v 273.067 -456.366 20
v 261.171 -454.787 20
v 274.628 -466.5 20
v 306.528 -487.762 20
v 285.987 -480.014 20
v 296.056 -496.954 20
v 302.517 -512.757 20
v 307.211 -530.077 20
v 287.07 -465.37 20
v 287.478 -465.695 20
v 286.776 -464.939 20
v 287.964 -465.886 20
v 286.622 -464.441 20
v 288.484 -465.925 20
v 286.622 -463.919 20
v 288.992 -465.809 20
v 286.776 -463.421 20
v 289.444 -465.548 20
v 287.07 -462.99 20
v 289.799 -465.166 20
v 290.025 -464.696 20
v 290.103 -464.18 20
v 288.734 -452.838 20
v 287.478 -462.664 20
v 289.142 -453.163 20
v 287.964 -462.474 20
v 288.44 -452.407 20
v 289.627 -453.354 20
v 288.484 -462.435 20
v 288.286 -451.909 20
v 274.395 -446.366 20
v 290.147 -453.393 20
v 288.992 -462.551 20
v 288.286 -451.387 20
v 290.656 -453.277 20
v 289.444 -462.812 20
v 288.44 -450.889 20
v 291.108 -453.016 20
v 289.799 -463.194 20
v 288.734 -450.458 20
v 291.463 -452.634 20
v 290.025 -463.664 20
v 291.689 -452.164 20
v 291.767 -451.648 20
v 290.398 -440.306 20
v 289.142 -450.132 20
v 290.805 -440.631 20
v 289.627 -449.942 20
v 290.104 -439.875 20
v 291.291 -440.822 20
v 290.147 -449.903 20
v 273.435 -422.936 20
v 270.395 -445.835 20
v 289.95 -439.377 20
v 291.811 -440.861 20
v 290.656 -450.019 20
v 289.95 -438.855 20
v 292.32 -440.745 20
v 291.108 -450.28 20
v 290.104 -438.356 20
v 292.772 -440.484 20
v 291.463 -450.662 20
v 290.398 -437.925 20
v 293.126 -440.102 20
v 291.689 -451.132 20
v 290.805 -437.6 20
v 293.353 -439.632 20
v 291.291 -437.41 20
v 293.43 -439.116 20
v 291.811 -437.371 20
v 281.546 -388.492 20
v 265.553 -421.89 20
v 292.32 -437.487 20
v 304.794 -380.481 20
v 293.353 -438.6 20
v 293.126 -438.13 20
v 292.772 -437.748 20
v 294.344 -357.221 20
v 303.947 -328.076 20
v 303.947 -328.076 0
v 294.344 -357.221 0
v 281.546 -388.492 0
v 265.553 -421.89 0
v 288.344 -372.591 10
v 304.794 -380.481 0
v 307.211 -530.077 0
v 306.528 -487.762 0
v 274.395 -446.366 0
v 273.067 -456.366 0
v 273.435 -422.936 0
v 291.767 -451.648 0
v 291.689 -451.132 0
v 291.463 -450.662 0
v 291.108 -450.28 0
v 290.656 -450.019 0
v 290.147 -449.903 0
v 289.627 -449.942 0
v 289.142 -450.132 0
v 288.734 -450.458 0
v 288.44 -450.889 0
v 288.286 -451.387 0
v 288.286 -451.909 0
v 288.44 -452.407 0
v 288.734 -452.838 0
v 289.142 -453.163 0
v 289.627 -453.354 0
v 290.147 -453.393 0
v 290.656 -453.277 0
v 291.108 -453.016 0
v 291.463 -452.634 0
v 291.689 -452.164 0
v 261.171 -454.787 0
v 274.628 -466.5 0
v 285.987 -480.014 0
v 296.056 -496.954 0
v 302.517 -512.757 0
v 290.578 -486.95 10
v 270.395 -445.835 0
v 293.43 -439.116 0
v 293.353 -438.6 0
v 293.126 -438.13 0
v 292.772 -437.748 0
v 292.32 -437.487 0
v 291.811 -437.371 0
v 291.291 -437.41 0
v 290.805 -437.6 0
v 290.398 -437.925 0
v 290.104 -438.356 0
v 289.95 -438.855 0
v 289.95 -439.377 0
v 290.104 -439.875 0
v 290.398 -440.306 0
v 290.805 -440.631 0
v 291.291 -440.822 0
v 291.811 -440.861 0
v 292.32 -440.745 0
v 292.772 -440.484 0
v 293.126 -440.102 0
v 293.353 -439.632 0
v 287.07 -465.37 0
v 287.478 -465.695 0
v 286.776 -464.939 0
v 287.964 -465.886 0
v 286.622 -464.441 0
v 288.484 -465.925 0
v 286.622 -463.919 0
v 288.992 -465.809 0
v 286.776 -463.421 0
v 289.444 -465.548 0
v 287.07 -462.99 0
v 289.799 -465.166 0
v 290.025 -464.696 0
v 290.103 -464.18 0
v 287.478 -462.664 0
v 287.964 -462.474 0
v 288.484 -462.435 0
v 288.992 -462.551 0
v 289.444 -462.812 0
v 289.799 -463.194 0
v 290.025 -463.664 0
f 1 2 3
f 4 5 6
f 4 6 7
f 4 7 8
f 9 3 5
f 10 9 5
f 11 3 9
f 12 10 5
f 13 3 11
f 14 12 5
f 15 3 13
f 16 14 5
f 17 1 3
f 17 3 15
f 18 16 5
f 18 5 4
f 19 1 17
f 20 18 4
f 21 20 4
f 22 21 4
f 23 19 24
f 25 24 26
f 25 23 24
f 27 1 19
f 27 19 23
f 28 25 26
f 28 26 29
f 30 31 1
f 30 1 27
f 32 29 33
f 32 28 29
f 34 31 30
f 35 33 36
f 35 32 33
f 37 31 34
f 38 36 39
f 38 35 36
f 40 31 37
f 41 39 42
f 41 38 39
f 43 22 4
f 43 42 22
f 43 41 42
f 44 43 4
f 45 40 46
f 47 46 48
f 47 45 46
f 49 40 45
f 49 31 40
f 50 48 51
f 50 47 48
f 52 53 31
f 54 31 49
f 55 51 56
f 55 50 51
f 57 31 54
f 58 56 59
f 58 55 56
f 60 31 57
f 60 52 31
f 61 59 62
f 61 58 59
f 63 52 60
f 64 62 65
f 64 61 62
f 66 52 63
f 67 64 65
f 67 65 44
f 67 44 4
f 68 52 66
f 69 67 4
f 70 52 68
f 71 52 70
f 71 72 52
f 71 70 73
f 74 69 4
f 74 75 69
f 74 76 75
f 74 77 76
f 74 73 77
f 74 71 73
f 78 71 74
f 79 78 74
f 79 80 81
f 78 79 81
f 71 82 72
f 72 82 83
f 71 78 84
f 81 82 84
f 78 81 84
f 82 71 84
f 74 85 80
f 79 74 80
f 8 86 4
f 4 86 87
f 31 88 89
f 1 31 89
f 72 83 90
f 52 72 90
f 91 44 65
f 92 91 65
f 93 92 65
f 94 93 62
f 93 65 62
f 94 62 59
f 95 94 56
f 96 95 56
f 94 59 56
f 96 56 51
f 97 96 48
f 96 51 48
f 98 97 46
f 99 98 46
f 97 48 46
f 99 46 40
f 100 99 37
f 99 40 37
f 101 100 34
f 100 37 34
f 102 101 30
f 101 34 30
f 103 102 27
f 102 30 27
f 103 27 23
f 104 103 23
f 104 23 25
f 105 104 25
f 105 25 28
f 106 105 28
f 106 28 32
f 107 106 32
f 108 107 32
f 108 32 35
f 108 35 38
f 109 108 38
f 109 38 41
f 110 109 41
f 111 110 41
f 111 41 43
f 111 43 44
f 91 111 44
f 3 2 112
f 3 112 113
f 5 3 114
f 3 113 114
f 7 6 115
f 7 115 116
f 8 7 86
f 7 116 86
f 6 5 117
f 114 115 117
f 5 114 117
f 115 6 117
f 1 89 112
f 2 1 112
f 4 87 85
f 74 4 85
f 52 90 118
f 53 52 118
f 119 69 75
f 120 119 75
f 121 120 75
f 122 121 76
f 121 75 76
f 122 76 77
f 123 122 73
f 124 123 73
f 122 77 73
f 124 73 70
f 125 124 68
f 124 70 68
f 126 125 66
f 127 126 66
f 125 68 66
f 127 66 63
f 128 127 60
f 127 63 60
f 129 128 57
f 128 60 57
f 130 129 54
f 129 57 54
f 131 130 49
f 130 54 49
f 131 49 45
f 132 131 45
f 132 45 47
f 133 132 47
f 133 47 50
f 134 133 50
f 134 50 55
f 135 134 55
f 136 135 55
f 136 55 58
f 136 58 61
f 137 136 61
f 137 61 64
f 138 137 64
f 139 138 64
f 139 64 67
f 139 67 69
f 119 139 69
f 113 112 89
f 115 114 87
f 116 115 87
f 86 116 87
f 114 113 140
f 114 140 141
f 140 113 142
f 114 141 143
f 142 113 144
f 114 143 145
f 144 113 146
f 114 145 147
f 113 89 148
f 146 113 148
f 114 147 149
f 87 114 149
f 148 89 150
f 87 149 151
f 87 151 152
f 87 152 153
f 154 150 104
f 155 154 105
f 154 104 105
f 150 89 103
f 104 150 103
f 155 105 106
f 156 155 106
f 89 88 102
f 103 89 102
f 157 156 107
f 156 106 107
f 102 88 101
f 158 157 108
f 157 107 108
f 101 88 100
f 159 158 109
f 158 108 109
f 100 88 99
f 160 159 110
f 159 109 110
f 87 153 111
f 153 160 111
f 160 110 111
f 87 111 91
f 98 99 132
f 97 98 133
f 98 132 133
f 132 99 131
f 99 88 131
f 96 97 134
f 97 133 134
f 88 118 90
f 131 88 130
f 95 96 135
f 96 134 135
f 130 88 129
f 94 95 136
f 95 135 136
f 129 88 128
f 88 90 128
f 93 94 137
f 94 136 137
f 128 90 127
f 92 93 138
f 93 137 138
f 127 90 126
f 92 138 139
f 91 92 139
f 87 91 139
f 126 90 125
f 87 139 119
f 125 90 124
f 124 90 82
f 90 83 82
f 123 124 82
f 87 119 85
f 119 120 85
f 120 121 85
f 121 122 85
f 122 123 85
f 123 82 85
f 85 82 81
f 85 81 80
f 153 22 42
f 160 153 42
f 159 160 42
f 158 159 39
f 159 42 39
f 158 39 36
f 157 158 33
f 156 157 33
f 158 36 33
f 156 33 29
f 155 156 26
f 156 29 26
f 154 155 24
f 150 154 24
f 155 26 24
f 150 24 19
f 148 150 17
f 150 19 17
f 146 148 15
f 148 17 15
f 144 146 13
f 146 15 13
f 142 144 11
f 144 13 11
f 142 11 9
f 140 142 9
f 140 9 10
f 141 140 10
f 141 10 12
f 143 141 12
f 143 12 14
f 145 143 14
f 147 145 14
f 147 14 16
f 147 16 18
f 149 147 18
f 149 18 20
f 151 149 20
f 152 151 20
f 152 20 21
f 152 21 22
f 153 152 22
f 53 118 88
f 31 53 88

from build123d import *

# Parameters (mm, degrees)
BOSS_EXTRUDE1_DEPTH = 20
SKETCH2_R           = 1.75
CUT_EXTRUDE1_DEPTH  = 613.992726316


with BuildPart() as part:
    # Sketch1 → Boss-Extrude1 (new body)
    with BuildSketch(Plane.XY):
        with BuildLine():
            Line((273.434767303, -422.936084161), (270.394702546, -445.835167249))
            Line((270.394702546, -445.835167249), (274.394702546, -446.36620419))
            Line((274.394702546, -446.36620419), (273.067110194, -456.36620419))
            Line((273.067110194, -456.36620419), (261.171482616, -454.78694977))
            add(Edge.make_bspline(
                [(261.171482616, -454.78694977), (296.963881998, -481.467411972), (307.211379584, -530.076645967)],
                knots=[0, 0, 0, 1, 1, 1], degree=2))
            Line((307.211379584, -530.076645967), (306.527614225, -487.761523765))
            Line((306.527614225, -487.761523765), (304.794080931, -380.481047826))
            Line((304.794080931, -380.481047826), (303.947271008, -328.075840548))
            add(Edge.make_bspline(
                [(303.947271008, -328.075840548), (291.93823329, -370.199418032), (265.55288805, -421.8896919)],
                knots=[0, 0, 0, 1, 1, 1], degree=2))
            Line((265.55288805, -421.8896919), (273.434767303, -422.936084161))
        make_face()
    extrude(amount=BOSS_EXTRUDE1_DEPTH)

    # Sketch2 → Cut-Extrude1 (cut, through all)
    with BuildSketch(Plane.XY.offset(20)):
        with Locations((288.352935212, -464.179893051)):
            Circle(SKETCH2_R)
        with Locations((290.016681941, -451.647832837)):
            Circle(SKETCH2_R)
        with Locations((291.68042867, -439.115772622)):
            Circle(SKETCH2_R)
    extrude(amount=-CUT_EXTRUDE1_DEPTH, mode=Mode.SUBTRACT)


solid = part.part
